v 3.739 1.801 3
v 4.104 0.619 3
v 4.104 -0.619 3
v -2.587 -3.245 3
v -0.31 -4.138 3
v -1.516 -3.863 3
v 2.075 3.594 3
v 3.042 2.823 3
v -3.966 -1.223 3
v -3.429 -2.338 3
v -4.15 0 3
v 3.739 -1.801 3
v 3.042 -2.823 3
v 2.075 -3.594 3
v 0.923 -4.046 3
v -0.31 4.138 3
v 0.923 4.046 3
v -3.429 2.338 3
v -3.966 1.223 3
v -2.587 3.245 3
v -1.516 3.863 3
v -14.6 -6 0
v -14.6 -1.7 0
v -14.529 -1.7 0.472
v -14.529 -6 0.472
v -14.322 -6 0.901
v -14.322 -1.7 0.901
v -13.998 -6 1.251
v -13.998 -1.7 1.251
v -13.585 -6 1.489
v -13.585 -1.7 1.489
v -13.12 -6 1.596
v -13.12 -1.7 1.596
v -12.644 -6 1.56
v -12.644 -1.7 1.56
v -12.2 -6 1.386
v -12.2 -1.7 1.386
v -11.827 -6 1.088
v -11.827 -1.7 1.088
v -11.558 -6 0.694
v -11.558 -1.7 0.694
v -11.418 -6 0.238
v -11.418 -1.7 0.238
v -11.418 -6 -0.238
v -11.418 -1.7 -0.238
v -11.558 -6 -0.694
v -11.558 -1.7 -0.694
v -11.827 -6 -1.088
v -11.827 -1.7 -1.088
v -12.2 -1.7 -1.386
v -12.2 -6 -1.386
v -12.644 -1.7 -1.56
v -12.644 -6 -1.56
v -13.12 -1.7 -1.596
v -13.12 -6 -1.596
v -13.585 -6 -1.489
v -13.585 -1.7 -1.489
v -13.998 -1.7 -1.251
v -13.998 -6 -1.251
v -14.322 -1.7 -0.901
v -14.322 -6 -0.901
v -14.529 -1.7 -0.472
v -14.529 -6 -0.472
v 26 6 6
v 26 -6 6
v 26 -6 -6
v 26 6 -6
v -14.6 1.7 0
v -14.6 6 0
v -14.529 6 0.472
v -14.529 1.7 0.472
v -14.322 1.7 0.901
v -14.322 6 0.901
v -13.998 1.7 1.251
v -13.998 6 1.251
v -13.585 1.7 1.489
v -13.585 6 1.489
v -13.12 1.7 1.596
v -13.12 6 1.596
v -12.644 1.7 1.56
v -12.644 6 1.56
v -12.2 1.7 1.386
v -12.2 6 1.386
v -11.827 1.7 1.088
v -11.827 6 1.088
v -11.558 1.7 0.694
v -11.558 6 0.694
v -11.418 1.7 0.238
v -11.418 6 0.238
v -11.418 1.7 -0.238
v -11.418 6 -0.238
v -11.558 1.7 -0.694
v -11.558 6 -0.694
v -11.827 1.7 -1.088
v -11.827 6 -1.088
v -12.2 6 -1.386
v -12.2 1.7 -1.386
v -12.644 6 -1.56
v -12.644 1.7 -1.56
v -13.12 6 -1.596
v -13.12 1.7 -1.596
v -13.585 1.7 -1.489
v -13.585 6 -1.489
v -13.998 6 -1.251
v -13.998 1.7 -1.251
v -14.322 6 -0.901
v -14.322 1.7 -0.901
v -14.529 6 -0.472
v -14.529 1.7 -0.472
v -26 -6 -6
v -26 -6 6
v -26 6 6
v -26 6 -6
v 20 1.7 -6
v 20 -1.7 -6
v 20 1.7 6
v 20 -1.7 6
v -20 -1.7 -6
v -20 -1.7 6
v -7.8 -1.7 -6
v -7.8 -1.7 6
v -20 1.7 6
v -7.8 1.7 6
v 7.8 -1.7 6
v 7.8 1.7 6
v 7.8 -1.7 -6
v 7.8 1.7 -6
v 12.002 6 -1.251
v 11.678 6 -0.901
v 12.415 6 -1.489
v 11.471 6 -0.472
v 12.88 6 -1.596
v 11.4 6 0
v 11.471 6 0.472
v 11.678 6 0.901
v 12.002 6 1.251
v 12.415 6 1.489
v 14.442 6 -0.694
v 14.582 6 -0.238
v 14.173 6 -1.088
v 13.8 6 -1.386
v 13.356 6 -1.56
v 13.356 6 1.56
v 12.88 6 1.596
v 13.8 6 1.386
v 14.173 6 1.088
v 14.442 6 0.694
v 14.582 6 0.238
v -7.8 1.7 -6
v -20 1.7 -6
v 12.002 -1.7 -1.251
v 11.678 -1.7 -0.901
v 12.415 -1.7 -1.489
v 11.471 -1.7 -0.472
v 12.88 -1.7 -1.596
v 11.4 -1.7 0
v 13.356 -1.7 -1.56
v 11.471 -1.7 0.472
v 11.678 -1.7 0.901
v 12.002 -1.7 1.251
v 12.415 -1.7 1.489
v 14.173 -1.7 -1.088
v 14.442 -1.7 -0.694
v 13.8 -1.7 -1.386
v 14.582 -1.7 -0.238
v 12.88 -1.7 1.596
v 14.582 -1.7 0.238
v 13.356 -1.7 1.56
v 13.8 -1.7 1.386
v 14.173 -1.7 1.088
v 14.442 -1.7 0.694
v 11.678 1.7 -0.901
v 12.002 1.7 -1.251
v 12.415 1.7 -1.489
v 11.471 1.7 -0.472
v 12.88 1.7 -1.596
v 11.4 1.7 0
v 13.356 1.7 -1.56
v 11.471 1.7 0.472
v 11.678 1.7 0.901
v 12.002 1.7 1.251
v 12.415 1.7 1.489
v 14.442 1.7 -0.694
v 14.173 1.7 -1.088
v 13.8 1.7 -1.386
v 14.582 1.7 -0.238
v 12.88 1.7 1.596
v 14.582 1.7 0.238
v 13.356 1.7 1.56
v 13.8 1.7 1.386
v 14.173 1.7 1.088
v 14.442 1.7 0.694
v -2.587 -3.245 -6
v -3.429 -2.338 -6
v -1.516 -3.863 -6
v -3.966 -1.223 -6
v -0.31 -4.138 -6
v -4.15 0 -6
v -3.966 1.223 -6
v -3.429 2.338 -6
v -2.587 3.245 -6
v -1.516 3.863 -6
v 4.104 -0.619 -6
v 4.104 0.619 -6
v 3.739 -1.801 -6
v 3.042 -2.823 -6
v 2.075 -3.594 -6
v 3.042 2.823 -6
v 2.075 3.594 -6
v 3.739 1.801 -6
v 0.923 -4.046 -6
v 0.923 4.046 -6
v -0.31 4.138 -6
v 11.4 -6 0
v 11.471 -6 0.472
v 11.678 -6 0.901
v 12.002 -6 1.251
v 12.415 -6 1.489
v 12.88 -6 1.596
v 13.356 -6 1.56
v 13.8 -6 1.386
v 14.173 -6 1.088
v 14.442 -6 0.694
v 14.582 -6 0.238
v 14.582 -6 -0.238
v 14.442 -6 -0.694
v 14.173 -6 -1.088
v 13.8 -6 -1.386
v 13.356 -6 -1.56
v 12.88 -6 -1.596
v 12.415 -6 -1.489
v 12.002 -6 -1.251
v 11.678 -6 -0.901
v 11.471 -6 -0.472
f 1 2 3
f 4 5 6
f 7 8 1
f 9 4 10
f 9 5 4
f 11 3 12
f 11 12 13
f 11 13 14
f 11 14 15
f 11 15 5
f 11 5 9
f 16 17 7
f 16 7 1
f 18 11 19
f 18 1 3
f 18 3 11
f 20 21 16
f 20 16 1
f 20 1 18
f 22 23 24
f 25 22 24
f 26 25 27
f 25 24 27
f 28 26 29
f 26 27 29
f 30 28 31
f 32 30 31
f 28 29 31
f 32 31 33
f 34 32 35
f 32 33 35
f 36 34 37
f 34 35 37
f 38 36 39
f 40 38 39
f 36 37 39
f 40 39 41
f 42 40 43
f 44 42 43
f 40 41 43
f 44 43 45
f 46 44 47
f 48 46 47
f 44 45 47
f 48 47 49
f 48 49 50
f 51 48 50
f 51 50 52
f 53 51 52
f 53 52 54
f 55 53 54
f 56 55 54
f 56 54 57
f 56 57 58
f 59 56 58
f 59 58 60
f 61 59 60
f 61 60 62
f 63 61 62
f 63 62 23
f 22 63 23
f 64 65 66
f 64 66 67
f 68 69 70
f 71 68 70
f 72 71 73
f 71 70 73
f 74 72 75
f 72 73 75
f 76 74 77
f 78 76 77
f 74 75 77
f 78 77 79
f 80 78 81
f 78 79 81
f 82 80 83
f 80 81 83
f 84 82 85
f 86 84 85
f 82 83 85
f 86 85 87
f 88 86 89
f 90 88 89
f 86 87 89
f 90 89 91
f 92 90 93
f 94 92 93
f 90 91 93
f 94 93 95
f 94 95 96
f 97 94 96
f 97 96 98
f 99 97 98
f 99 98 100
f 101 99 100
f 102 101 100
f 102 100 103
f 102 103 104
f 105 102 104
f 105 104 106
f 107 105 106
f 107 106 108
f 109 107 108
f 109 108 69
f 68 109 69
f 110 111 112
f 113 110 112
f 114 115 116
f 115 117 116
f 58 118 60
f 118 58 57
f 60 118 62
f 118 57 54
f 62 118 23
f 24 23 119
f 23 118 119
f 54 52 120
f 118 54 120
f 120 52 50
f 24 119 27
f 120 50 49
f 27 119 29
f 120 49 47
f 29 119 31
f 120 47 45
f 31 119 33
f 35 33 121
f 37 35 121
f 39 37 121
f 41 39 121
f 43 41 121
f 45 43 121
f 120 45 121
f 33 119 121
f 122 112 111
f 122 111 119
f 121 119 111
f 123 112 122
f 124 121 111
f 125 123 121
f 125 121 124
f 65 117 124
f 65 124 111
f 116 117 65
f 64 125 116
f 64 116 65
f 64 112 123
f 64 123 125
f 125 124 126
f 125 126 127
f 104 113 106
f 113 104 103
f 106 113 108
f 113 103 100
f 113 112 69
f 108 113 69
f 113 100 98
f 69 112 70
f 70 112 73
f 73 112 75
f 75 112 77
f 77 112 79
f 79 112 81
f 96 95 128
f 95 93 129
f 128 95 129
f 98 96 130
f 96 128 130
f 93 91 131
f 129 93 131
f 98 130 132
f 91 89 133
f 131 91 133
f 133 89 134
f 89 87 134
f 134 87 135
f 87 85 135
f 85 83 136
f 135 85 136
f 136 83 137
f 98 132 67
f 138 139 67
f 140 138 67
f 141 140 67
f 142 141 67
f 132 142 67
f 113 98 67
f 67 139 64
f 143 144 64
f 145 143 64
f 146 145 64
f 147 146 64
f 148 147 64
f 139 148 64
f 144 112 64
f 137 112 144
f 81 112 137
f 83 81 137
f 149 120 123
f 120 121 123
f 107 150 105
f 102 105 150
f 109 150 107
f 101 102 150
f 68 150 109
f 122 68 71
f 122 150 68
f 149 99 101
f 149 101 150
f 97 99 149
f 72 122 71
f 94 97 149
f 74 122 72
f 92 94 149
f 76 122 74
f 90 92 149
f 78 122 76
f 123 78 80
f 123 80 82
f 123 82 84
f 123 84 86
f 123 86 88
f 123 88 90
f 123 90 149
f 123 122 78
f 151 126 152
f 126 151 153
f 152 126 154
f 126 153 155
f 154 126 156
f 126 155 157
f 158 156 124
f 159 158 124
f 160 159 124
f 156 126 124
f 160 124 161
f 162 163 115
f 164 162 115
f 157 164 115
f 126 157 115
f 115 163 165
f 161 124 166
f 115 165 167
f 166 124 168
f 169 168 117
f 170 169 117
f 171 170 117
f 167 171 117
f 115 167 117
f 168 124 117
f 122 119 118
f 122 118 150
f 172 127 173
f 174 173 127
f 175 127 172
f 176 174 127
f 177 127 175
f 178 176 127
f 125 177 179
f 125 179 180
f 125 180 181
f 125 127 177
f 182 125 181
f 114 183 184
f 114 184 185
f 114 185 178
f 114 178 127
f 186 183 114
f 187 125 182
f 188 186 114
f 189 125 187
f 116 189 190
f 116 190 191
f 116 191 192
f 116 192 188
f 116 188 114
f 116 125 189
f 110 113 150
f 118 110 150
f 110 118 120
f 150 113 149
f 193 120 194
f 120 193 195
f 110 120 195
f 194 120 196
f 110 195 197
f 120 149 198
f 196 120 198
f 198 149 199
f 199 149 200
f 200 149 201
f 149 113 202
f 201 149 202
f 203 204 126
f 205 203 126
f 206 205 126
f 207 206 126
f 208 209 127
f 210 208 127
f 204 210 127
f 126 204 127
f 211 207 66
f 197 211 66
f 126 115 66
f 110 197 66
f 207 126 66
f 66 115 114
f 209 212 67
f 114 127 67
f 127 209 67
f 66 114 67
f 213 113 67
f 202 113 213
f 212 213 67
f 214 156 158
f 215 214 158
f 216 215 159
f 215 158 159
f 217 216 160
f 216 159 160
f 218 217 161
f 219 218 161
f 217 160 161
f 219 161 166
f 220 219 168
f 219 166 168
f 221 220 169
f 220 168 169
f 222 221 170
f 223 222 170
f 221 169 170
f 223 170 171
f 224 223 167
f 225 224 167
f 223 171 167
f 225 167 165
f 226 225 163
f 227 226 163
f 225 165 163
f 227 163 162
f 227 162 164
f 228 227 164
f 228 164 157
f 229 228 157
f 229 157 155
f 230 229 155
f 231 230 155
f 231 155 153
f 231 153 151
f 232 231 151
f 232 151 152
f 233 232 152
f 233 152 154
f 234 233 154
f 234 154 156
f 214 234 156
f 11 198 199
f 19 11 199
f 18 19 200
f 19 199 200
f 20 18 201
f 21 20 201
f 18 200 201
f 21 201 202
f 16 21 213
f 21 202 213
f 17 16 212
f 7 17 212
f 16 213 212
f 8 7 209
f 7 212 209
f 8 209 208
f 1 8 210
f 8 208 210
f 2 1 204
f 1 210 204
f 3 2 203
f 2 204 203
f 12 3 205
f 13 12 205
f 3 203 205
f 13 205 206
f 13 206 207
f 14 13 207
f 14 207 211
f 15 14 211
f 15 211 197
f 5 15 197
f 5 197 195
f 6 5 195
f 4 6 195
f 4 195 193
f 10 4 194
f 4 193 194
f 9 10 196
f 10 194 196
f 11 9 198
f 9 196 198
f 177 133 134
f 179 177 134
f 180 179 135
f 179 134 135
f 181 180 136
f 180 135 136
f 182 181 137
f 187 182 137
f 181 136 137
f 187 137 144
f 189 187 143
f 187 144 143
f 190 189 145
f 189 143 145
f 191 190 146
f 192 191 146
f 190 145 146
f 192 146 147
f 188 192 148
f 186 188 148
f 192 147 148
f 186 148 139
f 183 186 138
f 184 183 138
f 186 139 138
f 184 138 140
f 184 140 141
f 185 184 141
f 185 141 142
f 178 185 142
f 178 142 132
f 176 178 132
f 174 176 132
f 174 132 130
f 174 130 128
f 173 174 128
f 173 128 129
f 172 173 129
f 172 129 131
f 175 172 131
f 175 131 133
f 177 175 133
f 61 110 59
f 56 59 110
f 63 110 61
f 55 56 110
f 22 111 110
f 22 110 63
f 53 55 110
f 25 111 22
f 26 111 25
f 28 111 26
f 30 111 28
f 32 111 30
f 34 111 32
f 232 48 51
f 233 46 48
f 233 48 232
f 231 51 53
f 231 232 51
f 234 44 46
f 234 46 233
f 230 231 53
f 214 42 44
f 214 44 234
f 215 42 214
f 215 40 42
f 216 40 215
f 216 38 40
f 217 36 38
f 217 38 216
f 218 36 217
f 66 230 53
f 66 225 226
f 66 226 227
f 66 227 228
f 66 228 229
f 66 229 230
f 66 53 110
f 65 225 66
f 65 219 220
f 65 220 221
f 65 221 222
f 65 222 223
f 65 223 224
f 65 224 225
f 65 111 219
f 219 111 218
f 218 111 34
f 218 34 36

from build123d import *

# Parameters (mm, degrees)
CROQUIS1_W              = 52
CROQUIS1_H              = 12
CROQUIS1_W_2            = 12.2
CROQUIS1_H_2            = 3.4
SALIENTE_EXTRUIR1_DEPTH = 6
CROQUIS2_R              = 4.15
CORTAR_EXTRUIR1_DEPTH   = 9
CROQUIS3_R              = 1.6
CORTAR_EXTRUIR2_DEPTH   = 30


with BuildPart() as part:
    # Croquis1 → Saliente-Extruir1 (new, symmetric)
    with BuildSketch(Plane.XY):
        Rectangle(CROQUIS1_W, CROQUIS1_H)
        with Locations((13.9, 0)):
            Rectangle(CROQUIS1_W_2, CROQUIS1_H_2, mode=Mode.SUBTRACT)
        with Locations((-13.9, 0)):
            Rectangle(CROQUIS1_W_2, CROQUIS1_H_2, mode=Mode.SUBTRACT)
    extrude(amount=SALIENTE_EXTRUIR1_DEPTH, both=True)

    # Croquis2 → Cortar-Extruir1 (cut)
    with BuildSketch(Plane(origin=(0, 0, -6), x_dir=(-1, 0, 0), z_dir=(0, 0, -1))):
        Circle(CROQUIS2_R)
    extrude(amount=-CORTAR_EXTRUIR1_DEPTH, mode=Mode.SUBTRACT)

    # Croquis3 → Cortar-Extruir2 (cut)
    with BuildSketch(Plane(origin=(0, 6, 0), x_dir=(1, 0, 0), z_dir=(0, 1, 0))):
        with Locations(Location((-13, 0, 0), (0, 0, 180))):
            Circle(CROQUIS3_R)
        with Locations(Location((13, 0, 0), (0, 0, 180))):
            Circle(CROQUIS3_R)
    extrude(amount=-CORTAR_EXTRUIR2_DEPTH, mode=Mode.SUBTRACT)


solid = part.part
